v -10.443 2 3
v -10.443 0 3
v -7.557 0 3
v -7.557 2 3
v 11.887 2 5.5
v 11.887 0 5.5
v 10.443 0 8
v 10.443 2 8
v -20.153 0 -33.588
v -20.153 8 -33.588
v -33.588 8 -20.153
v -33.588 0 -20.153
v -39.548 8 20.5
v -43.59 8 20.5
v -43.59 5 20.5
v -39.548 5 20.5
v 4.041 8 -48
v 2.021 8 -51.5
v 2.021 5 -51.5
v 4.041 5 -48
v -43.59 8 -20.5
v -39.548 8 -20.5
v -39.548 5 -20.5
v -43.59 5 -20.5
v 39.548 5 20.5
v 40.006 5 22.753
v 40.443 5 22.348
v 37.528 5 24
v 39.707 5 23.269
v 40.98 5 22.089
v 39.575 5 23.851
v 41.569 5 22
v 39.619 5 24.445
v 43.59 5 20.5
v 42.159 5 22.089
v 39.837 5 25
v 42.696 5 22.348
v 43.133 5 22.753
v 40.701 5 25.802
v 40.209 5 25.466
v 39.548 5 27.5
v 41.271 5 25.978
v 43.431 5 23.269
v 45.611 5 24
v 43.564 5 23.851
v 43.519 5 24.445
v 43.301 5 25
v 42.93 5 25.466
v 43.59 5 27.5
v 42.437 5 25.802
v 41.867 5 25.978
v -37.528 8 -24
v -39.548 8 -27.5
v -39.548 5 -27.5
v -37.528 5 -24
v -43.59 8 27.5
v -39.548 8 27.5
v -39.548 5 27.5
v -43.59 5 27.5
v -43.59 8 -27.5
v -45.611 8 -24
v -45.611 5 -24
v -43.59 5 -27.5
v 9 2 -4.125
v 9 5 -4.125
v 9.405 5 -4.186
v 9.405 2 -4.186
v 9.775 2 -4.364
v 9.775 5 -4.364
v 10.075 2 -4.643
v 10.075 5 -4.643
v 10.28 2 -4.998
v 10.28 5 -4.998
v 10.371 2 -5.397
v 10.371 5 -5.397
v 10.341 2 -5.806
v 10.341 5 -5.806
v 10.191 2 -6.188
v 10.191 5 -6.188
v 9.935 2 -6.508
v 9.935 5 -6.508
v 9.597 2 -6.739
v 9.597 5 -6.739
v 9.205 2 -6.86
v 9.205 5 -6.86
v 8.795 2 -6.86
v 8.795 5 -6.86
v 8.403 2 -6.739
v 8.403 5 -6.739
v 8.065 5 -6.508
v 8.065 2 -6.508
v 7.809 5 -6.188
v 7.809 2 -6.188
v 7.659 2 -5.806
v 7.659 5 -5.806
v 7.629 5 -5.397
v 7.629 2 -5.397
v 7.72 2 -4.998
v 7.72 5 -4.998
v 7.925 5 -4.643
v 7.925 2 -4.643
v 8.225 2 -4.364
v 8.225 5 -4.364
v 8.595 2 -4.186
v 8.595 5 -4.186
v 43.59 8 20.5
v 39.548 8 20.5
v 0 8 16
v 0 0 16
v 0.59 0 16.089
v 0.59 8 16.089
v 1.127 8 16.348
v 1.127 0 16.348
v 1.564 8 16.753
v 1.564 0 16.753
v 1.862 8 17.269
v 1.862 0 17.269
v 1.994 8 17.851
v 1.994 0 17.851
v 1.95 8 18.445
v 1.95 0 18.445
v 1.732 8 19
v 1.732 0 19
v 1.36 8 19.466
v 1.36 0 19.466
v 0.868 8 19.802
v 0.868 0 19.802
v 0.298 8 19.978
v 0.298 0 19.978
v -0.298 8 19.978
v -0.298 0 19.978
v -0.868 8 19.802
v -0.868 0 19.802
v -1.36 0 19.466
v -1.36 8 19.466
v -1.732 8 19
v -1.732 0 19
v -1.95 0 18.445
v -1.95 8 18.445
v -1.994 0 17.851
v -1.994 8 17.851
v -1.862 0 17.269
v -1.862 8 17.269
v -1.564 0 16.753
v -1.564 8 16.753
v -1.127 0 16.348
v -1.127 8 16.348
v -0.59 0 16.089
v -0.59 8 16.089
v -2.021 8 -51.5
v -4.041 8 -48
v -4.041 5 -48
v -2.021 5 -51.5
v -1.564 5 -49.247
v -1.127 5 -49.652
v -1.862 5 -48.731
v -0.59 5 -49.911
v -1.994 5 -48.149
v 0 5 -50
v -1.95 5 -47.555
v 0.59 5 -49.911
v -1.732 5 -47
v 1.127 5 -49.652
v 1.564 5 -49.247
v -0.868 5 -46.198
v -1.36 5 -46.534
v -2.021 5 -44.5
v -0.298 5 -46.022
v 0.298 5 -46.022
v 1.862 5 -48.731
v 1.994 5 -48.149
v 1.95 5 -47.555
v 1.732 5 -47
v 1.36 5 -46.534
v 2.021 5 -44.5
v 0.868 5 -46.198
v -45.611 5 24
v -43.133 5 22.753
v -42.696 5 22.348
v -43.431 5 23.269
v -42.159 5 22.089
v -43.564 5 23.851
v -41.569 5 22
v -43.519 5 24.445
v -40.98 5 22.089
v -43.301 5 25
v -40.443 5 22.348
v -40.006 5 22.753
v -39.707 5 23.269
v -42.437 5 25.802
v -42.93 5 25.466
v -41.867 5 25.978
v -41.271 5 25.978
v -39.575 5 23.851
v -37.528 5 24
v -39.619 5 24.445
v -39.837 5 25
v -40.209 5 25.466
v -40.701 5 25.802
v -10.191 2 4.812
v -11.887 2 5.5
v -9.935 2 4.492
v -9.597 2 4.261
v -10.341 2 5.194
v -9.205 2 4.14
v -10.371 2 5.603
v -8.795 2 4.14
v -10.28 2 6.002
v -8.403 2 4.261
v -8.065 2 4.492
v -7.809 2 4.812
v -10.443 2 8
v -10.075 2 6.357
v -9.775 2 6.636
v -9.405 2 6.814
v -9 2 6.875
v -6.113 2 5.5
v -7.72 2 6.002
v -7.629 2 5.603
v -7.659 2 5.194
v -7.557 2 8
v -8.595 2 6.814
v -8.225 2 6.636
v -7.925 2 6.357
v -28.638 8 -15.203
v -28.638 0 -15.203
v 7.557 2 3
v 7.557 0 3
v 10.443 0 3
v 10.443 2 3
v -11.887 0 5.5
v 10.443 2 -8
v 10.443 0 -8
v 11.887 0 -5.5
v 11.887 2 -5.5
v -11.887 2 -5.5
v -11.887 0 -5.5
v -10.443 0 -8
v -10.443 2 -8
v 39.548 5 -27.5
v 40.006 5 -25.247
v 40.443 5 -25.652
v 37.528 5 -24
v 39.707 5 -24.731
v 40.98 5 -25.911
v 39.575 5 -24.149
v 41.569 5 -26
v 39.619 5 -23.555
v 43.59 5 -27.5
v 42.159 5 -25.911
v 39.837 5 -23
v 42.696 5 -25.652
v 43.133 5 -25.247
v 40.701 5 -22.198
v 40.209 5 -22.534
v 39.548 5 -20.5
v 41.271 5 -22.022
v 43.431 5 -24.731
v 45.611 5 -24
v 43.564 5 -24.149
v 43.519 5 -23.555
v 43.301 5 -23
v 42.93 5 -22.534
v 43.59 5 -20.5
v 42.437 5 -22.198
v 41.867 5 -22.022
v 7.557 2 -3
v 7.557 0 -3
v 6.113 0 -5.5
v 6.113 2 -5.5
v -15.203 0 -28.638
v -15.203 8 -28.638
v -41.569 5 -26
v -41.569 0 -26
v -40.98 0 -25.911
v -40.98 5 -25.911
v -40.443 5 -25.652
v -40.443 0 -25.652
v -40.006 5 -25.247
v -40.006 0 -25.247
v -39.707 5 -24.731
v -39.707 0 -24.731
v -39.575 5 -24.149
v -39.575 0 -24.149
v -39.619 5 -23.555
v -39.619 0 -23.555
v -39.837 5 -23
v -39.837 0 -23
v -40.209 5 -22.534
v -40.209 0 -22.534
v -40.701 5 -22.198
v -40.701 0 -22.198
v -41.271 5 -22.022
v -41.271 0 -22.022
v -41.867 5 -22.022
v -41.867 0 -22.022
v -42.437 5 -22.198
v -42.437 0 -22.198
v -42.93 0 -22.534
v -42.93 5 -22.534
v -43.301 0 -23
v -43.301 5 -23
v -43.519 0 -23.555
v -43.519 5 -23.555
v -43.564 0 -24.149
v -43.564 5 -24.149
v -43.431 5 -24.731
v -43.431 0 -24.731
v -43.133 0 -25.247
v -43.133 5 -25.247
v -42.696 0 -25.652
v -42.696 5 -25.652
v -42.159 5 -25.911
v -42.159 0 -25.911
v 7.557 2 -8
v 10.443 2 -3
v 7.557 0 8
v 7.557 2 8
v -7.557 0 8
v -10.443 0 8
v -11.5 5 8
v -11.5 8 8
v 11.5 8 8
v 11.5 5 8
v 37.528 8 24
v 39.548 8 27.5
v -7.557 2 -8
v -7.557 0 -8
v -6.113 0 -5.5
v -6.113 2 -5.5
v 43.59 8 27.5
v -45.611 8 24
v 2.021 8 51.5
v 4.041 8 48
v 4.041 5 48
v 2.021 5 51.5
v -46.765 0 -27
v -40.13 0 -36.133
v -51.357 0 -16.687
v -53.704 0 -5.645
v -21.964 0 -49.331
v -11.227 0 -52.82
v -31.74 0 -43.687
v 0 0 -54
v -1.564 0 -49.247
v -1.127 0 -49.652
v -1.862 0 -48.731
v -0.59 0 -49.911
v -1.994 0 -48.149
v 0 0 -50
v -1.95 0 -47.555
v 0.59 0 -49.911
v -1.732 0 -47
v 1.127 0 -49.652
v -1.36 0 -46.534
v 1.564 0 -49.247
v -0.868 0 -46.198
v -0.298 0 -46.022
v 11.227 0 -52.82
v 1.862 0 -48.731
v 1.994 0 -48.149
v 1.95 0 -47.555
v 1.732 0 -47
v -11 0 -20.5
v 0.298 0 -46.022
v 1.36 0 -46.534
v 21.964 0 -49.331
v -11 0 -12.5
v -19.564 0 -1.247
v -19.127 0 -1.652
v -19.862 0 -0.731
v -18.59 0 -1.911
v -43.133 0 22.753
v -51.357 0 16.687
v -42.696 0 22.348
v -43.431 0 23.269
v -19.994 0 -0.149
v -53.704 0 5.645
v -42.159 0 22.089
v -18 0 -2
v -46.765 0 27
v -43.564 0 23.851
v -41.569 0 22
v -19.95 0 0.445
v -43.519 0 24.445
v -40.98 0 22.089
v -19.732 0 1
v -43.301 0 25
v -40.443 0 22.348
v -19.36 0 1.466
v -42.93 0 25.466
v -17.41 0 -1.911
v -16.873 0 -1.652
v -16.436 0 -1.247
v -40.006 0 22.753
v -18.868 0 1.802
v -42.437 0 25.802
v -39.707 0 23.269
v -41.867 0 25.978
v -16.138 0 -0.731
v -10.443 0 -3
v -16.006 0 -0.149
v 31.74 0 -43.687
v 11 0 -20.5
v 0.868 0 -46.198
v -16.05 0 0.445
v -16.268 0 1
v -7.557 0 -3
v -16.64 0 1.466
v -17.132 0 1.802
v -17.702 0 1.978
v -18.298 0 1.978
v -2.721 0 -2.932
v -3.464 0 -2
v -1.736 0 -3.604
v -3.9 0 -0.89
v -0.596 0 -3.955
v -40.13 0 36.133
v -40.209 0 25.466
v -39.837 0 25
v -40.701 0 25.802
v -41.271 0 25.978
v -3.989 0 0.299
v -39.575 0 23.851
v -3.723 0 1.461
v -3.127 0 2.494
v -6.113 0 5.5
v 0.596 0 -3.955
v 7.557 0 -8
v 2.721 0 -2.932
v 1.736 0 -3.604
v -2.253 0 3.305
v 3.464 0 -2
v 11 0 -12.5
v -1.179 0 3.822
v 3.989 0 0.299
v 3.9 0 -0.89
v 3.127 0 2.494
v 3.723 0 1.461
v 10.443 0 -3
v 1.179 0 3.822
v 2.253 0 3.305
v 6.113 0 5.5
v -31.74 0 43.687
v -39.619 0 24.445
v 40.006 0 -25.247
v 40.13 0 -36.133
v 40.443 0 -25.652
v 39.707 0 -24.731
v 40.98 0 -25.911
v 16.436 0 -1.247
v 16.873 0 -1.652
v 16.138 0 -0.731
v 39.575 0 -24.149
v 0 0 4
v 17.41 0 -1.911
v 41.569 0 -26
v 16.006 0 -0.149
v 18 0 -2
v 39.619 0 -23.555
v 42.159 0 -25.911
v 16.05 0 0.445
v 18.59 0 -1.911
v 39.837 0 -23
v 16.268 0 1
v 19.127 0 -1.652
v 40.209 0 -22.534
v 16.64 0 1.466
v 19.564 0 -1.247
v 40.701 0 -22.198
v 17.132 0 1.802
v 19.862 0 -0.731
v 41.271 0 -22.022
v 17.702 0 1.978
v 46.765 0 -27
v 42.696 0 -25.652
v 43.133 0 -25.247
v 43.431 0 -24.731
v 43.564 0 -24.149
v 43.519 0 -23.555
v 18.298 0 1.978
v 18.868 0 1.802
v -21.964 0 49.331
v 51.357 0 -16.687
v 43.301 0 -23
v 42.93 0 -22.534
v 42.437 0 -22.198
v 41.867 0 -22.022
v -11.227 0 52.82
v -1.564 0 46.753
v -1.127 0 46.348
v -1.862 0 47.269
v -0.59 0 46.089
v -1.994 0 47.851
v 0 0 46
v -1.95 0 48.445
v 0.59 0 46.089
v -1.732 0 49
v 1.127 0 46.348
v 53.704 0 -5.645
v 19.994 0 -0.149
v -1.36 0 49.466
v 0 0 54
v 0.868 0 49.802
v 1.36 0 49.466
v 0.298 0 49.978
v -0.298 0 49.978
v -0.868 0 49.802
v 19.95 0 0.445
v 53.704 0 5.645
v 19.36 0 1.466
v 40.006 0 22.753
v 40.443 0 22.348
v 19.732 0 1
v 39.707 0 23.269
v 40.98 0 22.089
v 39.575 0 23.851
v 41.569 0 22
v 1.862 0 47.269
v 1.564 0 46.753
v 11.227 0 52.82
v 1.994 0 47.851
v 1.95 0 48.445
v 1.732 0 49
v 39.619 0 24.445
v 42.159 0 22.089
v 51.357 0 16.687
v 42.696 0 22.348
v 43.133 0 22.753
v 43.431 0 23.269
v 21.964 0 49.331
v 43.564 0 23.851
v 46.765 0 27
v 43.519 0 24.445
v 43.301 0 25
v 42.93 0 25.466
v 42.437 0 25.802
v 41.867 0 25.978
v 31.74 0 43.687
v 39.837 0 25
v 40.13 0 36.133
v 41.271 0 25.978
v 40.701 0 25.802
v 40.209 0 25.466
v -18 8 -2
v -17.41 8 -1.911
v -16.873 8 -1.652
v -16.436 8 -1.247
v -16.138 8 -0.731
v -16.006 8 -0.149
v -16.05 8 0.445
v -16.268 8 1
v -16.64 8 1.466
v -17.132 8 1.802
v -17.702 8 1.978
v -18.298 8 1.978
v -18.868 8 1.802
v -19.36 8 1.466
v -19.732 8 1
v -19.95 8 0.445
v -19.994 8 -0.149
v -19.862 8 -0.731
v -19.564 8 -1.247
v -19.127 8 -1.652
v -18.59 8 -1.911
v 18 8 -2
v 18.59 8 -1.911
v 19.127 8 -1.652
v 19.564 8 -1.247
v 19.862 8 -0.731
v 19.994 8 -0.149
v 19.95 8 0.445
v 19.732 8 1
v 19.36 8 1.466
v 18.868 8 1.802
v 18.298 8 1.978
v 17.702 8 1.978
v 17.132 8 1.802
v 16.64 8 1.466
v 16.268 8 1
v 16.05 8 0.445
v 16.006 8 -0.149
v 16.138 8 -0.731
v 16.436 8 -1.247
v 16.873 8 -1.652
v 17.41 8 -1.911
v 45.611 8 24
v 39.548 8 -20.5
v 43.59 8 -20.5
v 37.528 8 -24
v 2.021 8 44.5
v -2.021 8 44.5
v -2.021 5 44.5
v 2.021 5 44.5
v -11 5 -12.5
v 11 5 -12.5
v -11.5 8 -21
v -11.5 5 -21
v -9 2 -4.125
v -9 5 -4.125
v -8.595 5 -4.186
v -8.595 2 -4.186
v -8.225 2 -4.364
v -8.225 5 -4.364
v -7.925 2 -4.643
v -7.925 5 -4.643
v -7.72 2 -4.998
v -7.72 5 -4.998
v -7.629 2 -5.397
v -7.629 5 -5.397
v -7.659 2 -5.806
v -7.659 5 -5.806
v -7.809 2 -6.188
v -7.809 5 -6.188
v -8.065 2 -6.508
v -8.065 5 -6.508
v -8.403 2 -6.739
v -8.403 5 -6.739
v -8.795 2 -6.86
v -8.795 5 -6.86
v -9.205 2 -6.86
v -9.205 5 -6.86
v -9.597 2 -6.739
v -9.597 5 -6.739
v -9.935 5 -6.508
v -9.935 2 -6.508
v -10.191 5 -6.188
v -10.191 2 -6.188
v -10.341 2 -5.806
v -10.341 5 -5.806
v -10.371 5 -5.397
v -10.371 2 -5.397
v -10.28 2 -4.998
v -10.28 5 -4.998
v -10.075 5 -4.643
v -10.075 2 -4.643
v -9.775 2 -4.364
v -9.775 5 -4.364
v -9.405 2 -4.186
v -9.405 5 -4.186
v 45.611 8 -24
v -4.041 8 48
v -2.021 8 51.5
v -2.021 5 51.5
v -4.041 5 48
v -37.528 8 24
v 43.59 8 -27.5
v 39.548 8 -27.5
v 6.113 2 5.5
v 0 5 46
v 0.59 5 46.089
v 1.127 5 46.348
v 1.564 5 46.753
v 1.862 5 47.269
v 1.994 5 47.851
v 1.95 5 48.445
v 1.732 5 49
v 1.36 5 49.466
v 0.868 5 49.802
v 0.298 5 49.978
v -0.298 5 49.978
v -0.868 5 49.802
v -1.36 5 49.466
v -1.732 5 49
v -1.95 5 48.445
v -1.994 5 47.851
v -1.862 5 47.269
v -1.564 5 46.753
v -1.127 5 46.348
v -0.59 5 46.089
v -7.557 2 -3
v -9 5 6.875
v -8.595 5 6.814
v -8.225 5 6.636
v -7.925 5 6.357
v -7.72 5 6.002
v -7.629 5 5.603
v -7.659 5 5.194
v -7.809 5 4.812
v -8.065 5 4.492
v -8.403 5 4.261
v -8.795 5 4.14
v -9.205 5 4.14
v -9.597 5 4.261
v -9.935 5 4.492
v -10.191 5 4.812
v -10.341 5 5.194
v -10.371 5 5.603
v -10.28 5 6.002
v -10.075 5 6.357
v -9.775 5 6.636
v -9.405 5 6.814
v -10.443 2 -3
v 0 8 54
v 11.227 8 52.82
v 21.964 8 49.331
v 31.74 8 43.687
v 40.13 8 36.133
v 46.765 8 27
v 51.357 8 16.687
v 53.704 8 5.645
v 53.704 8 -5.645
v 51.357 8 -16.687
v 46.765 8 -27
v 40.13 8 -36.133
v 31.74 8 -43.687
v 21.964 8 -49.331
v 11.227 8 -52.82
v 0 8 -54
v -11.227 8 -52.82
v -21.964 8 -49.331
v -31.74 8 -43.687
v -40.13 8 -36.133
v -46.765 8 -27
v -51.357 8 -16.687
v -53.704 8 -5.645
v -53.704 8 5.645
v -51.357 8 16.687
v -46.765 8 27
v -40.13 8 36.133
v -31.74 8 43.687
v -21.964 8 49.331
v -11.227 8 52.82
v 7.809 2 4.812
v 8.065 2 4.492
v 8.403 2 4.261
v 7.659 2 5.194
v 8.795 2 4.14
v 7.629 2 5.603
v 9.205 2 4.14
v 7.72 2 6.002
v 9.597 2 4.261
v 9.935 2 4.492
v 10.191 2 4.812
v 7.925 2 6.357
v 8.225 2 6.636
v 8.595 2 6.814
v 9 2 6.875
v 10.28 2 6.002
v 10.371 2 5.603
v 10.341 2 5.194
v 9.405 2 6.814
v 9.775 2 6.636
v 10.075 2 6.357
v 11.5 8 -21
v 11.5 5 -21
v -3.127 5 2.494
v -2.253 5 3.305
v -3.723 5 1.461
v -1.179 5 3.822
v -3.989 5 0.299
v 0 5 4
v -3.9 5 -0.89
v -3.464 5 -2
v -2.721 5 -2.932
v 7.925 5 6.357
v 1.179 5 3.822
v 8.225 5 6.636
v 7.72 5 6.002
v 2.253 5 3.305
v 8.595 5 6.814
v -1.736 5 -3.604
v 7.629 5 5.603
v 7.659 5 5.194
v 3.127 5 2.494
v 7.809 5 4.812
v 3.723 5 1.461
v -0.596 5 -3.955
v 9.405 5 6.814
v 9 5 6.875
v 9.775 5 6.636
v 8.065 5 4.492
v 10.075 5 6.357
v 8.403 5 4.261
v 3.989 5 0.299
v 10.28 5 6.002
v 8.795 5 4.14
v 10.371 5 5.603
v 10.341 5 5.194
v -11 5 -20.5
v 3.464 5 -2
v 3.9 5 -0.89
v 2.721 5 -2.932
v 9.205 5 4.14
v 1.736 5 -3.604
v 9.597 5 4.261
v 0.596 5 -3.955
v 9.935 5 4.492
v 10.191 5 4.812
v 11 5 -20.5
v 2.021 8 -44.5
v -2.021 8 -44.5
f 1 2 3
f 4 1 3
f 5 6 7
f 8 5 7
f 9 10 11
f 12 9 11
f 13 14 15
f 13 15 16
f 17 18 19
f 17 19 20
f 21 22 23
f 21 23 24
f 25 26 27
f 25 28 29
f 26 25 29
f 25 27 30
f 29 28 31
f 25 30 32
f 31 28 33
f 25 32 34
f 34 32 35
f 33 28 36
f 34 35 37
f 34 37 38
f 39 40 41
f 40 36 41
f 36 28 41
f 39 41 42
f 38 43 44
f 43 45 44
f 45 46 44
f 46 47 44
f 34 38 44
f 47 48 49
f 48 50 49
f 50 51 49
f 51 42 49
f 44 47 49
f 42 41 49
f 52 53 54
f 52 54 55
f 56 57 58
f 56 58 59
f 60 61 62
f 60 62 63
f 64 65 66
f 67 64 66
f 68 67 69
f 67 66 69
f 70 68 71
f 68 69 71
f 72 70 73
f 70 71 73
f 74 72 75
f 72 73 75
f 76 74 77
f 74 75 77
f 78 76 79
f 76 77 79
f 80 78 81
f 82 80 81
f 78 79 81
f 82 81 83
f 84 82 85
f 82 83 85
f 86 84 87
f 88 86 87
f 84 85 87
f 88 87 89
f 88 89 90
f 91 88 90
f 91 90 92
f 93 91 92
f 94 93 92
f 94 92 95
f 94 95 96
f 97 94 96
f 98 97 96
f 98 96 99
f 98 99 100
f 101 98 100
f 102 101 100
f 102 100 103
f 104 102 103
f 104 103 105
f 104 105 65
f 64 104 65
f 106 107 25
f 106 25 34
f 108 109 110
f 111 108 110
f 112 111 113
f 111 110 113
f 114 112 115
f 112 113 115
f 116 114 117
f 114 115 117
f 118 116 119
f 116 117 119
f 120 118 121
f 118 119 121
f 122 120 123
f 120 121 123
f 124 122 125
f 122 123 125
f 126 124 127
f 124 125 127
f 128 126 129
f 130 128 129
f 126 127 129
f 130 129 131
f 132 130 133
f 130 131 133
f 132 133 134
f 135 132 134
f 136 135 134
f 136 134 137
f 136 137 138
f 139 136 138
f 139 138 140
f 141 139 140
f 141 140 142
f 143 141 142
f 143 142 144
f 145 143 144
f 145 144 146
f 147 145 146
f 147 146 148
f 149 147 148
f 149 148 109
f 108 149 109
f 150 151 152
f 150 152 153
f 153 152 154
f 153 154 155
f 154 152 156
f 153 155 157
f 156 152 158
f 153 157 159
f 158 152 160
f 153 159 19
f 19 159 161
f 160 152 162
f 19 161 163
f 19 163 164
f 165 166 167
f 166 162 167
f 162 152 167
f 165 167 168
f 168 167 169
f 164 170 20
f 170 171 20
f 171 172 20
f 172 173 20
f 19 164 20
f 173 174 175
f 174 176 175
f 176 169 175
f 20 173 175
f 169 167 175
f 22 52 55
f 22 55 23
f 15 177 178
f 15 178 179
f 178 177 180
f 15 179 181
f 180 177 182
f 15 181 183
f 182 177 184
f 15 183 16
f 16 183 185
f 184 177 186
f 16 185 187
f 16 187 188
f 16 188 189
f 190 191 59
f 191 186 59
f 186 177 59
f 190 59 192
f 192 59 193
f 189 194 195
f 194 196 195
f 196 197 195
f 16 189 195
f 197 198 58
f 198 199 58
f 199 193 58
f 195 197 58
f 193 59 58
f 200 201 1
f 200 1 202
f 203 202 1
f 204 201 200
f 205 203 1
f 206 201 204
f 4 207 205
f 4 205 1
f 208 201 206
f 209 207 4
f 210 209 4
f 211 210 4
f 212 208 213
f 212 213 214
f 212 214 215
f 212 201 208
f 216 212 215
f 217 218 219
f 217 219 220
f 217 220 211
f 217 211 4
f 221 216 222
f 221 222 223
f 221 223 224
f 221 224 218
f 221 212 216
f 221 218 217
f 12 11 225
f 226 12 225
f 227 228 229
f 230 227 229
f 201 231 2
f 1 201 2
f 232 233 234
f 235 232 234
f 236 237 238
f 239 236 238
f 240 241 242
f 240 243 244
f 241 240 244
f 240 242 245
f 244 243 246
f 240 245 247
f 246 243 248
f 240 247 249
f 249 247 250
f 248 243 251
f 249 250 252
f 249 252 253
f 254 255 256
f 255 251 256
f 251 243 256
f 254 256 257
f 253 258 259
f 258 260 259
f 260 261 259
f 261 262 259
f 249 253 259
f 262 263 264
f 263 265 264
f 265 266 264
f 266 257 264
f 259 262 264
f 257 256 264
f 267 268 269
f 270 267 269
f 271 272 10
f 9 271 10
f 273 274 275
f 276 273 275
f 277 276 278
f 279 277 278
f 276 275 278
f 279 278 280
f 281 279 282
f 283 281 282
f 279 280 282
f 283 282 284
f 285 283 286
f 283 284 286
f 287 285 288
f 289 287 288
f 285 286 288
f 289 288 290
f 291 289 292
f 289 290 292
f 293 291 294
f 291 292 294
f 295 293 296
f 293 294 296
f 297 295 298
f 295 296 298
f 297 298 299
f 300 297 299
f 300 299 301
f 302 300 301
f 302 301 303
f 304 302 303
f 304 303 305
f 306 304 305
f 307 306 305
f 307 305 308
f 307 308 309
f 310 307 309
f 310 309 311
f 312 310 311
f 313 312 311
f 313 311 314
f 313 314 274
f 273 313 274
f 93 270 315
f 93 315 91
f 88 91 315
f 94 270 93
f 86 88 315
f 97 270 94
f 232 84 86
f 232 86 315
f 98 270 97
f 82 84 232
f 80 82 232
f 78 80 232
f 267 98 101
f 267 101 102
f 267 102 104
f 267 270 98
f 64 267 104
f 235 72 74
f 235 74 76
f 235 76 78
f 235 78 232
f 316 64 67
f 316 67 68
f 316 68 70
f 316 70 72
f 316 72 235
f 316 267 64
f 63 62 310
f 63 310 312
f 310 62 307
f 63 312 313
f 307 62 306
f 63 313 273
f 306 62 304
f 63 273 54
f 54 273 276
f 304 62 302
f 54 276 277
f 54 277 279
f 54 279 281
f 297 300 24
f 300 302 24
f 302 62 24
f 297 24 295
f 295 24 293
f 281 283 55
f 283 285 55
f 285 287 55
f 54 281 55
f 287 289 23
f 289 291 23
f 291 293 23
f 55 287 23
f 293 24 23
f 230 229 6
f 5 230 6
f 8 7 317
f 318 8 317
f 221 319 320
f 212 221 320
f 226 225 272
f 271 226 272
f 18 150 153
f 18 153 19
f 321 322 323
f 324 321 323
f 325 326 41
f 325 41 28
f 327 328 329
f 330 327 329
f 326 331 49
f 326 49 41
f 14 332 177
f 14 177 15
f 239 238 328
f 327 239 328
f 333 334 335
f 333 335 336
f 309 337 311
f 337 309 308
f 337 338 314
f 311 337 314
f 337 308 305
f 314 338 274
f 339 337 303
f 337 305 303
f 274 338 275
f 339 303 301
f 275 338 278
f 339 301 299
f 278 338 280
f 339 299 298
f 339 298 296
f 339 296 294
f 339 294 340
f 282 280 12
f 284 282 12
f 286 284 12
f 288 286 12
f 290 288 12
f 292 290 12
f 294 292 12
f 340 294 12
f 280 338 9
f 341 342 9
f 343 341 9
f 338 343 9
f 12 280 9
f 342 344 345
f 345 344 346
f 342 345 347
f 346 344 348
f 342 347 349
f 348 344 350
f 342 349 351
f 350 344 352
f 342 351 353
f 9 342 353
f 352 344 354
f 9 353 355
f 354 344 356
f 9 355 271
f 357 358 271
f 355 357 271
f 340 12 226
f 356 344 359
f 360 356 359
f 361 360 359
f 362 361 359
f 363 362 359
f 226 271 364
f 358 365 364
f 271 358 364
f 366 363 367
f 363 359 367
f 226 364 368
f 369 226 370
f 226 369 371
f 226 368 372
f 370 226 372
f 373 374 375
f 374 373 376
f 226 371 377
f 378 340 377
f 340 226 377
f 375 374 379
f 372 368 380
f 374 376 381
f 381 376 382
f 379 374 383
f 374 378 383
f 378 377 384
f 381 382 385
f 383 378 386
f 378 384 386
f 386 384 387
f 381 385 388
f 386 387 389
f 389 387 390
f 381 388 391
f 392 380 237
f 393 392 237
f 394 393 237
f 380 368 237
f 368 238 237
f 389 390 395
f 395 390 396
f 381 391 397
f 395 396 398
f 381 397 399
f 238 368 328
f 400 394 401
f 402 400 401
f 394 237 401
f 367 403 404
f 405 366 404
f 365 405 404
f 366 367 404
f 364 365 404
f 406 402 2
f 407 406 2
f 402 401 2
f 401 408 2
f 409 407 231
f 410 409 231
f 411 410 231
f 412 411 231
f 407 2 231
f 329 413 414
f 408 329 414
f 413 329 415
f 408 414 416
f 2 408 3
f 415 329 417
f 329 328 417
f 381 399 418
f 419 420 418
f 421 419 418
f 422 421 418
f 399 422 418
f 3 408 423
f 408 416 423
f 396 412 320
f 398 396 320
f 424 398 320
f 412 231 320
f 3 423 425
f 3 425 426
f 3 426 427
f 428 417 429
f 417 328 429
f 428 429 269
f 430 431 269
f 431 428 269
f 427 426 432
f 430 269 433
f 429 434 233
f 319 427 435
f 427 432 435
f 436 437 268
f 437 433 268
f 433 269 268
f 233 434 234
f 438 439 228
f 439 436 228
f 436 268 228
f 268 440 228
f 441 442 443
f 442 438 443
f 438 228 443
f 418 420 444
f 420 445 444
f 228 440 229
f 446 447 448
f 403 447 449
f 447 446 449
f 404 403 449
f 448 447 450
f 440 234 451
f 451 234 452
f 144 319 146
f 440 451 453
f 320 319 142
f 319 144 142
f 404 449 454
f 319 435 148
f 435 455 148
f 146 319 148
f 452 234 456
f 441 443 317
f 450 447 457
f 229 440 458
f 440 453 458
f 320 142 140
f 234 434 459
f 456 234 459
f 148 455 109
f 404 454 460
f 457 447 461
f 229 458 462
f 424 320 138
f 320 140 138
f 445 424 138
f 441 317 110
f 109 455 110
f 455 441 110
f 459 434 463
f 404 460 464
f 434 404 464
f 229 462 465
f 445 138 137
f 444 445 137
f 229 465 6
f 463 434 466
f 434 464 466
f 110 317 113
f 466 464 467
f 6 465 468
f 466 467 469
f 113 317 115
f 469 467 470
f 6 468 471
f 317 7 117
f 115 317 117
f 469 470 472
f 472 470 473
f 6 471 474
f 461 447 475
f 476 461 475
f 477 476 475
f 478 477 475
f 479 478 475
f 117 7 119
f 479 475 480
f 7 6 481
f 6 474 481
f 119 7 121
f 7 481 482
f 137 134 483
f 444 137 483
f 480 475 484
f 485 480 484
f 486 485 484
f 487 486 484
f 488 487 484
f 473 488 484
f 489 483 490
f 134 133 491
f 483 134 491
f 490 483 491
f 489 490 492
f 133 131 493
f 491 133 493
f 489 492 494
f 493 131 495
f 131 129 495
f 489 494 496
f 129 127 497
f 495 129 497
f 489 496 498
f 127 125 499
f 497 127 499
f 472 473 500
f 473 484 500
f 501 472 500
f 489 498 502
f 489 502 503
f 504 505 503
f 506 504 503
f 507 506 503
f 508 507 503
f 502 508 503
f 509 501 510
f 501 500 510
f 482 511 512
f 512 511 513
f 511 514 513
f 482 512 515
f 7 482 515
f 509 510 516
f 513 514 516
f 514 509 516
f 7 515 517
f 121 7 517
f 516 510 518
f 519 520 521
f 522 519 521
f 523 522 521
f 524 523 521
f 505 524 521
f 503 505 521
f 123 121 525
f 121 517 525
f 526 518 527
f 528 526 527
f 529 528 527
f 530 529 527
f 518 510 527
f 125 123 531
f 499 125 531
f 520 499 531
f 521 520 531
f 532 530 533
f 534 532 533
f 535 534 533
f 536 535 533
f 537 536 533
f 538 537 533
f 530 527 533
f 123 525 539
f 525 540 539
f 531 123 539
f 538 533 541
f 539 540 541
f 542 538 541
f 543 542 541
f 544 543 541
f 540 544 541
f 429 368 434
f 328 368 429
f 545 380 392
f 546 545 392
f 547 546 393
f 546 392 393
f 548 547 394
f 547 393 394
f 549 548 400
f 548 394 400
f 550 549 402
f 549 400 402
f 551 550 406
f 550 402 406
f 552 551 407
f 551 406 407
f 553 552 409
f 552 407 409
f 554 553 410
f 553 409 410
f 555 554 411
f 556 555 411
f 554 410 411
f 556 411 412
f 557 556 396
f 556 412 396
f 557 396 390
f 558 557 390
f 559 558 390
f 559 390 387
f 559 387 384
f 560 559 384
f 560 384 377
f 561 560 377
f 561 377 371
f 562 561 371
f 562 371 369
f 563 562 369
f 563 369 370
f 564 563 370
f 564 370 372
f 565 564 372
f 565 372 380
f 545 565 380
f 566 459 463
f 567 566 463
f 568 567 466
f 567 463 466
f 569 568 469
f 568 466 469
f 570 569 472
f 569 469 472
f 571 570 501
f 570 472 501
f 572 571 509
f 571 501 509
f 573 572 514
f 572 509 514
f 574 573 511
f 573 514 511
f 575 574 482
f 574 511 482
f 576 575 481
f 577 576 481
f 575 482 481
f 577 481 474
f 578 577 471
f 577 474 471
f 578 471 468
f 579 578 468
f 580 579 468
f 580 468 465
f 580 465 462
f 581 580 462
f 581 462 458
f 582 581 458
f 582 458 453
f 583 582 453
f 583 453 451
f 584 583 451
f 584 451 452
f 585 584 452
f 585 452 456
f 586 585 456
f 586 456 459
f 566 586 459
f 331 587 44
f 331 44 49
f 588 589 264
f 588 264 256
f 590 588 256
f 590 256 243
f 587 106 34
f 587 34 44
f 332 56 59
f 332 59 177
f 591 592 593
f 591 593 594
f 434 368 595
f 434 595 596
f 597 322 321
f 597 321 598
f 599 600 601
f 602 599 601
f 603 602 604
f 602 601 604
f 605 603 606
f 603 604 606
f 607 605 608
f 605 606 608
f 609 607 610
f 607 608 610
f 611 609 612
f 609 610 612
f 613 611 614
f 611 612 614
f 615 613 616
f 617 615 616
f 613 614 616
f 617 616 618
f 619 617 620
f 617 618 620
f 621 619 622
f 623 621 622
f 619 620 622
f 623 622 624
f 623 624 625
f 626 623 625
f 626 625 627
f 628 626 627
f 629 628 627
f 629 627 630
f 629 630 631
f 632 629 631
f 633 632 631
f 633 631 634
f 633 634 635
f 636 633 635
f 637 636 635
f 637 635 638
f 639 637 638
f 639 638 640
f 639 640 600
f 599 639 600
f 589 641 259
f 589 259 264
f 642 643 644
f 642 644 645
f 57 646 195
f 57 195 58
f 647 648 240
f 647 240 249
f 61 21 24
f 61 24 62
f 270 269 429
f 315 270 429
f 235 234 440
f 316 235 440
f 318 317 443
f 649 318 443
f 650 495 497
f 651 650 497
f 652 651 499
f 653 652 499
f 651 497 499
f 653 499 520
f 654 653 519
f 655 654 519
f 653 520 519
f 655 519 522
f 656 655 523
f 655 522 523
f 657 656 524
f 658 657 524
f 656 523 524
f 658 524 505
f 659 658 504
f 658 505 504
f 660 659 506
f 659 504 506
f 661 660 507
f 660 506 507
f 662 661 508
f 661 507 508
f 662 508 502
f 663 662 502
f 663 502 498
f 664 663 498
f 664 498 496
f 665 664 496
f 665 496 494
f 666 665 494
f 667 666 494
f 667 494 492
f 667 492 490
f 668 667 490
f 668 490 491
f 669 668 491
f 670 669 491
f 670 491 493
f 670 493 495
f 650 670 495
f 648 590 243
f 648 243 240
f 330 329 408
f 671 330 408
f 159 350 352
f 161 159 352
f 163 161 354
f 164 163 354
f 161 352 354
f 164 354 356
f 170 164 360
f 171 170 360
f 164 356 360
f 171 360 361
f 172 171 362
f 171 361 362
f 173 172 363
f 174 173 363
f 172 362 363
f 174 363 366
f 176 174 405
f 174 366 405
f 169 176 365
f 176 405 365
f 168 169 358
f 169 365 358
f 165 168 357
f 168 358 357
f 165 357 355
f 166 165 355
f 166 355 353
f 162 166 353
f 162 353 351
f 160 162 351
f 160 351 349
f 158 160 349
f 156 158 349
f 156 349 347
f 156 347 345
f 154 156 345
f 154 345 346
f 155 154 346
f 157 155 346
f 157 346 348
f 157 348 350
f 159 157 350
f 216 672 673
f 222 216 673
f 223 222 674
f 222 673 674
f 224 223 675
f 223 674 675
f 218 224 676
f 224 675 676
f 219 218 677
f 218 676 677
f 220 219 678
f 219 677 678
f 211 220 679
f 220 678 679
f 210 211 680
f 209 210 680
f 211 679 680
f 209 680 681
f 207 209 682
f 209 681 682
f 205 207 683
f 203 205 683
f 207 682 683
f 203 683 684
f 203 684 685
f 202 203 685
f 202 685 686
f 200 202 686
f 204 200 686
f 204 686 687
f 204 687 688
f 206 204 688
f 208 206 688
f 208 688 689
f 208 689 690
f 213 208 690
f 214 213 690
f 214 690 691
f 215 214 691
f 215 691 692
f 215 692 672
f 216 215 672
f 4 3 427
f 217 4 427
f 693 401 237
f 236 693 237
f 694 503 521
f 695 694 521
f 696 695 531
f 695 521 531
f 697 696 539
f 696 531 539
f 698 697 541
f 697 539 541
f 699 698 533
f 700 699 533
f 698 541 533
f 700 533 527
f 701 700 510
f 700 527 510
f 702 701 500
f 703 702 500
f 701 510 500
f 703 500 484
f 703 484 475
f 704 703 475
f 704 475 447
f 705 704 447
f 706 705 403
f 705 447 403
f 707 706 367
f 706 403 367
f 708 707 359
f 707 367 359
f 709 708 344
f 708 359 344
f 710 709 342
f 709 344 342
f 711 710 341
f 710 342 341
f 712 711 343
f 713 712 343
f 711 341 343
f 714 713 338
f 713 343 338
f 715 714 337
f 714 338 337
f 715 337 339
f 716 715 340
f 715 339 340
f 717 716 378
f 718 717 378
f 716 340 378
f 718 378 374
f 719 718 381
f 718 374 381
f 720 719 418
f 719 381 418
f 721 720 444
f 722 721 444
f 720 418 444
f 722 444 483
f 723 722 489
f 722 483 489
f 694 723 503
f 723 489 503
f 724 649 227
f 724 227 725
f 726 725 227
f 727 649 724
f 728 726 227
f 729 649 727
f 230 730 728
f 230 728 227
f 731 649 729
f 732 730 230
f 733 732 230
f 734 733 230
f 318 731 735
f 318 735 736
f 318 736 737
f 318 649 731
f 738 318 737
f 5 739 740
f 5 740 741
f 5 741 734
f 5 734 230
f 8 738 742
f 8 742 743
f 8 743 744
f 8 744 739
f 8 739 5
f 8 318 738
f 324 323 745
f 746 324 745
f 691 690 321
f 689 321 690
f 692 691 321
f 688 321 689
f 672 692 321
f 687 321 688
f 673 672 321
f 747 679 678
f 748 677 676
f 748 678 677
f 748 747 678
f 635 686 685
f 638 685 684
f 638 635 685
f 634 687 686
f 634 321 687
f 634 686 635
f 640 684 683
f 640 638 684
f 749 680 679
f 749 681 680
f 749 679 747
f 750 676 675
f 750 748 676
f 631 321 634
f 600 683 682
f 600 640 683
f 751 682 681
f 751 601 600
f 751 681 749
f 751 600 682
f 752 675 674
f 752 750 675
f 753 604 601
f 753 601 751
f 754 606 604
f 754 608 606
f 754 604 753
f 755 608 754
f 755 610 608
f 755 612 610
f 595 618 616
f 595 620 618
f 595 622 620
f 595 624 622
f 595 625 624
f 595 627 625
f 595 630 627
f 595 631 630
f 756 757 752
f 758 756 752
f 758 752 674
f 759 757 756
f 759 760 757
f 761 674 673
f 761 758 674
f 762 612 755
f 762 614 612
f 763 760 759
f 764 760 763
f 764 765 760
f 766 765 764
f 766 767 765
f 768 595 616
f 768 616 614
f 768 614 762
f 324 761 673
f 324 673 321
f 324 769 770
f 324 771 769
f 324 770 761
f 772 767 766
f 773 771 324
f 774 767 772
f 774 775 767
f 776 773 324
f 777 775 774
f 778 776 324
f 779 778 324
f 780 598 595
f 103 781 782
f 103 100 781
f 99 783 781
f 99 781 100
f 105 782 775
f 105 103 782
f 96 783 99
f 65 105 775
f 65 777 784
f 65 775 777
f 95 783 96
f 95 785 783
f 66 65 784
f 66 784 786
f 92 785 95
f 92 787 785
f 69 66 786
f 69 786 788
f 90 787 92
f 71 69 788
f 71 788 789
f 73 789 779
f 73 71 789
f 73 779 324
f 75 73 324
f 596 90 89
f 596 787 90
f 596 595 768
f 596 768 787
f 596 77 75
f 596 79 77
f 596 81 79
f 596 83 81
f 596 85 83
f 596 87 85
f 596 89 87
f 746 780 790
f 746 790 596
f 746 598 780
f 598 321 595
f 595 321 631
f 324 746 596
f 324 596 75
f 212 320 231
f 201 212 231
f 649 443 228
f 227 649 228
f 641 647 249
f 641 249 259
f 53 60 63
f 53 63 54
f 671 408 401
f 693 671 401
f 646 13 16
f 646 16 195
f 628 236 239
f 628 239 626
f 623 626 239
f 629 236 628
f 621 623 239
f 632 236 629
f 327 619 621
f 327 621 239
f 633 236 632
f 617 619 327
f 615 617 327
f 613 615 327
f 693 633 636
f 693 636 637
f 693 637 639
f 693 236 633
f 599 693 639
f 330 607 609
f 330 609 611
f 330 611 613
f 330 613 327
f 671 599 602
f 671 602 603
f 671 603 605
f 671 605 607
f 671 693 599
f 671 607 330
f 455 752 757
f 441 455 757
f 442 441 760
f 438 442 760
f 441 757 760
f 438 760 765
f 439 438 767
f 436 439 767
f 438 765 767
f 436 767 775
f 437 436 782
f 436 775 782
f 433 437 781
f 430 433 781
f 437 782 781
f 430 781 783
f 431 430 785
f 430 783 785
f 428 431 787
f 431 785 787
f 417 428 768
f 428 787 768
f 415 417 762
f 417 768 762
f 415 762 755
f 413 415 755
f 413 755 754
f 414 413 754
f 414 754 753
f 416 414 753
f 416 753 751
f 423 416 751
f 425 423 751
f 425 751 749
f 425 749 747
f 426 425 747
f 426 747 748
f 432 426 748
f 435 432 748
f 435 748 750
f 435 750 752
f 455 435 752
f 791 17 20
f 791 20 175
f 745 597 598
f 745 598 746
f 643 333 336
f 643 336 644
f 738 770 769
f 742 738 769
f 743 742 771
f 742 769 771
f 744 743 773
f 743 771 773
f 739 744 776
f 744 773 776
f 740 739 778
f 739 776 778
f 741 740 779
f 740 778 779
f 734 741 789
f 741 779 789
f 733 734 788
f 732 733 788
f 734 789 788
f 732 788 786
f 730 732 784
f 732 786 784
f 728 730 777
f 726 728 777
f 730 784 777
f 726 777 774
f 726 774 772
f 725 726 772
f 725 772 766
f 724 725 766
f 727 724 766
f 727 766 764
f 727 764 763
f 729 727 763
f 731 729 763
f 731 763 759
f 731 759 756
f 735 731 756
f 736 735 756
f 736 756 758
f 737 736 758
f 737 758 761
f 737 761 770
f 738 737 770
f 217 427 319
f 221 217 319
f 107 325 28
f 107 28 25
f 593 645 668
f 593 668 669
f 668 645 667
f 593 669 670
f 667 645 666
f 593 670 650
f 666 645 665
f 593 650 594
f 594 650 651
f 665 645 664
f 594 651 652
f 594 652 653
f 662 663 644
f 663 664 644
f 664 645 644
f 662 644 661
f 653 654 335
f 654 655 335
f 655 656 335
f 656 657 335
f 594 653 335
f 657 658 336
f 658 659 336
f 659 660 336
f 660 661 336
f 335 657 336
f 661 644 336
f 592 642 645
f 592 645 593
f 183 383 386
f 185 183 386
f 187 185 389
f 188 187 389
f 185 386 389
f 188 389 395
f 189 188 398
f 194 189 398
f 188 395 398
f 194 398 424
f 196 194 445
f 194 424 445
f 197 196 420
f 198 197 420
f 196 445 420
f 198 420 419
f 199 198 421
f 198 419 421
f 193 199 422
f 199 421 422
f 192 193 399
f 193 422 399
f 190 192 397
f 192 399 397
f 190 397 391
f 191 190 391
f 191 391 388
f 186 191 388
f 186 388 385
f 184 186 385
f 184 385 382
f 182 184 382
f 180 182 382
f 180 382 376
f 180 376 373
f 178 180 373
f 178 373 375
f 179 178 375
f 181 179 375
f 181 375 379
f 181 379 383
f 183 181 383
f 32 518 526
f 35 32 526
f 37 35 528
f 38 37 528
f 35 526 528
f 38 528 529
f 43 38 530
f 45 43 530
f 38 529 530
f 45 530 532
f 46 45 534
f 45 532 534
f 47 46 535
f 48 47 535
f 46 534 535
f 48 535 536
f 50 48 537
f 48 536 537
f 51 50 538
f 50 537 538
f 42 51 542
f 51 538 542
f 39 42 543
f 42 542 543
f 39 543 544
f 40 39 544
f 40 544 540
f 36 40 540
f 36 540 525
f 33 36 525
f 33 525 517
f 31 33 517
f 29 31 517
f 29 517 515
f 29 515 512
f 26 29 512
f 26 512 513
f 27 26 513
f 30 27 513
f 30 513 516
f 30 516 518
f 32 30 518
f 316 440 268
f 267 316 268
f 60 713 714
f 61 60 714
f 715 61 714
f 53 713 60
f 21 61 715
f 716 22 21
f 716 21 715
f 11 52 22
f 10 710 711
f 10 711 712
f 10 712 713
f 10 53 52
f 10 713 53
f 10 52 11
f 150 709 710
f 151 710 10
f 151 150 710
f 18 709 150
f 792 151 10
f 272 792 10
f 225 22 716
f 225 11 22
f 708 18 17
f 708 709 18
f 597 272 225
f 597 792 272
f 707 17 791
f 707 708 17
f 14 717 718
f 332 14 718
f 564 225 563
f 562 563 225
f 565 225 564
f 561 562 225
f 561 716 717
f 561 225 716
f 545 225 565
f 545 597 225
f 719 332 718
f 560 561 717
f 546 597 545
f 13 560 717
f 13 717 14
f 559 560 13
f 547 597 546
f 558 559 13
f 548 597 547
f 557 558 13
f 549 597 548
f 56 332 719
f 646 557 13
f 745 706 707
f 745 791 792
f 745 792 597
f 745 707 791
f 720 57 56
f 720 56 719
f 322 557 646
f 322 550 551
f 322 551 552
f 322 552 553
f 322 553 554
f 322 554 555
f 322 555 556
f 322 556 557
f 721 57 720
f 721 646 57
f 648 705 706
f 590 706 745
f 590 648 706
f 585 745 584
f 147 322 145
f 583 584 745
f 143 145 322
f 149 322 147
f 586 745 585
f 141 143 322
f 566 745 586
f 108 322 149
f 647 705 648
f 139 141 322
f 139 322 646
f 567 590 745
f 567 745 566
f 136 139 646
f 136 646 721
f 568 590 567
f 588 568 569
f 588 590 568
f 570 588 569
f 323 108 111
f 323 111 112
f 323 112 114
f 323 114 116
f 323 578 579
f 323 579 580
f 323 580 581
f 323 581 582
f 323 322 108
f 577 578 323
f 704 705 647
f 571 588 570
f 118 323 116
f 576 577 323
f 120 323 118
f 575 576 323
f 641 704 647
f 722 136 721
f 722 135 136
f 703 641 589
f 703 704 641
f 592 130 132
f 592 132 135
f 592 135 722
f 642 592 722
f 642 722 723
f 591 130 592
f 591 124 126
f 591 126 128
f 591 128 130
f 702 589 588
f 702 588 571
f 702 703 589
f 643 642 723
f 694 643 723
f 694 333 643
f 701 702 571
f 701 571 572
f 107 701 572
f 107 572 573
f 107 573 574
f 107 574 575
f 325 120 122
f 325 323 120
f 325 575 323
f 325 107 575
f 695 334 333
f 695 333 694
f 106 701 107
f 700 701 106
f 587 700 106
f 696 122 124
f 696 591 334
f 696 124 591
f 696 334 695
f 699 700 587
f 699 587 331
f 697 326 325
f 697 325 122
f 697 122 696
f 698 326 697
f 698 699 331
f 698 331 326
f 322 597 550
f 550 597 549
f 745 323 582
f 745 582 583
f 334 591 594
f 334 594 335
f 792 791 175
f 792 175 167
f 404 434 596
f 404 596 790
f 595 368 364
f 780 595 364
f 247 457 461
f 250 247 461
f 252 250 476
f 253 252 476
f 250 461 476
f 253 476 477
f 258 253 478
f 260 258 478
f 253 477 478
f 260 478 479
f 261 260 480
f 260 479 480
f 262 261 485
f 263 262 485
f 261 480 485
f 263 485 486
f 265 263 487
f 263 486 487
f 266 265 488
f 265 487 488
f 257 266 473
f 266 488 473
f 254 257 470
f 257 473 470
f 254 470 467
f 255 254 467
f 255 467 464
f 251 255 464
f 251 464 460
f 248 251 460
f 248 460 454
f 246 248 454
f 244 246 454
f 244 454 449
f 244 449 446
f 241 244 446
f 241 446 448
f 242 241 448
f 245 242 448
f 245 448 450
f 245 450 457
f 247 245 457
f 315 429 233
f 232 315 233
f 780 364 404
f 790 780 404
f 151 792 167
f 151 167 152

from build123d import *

# Parameters (mm, degrees)
SKETCH1_R                       = 54
BASE_PLATE_DEPTH                = 8
HOLE_PATTERN_R                  = 2
MOTOR_MOUNT_HOLES_DEPTH         = 77.785415282
SKETCH3_R                       = 1.375
SKETCH3_R_2                     = 4
ENCODER_MOUNTING_HOLES_DEPTH    = 77.785415282
SKETCH4_W                       = 22
SKETCH4_H                       = 8
ENCODER_WIRE_PASS_THROUGH_DEPTH = 5
MOTOR_WIRE_PASS_THROUGH_DEPTH   = 77.785415282
SKETCH6_W                       = 11.998985868
SKETCH6_H                       = 14
CUT_EXTRUDE6_DEPTH              = 2
CUT_EXTRUDE7_DEPTH              = 2
CUT_EXTRUDE8_DEPTH              = 3
SKETCH10_W                      = 23
SKETCH10_H                      = 29
CUT_EXTRUDE9_DEPTH              = 3


with BuildPart() as part:
    # Sketch1 → Base Plate (new body)
    with BuildSketch(Plane(origin=(0, 0, 0), x_dir=(1, 0, 0), z_dir=(0, 1, 0))):
        with Locations(Location((0, 0, 0), (0, 0, 270))):
            Circle(SKETCH1_R)
    extrude(amount=BASE_PLATE_DEPTH)

    # Hole Pattern → Motor Mount Holes (cut, through all)
    with BuildSketch(Plane.XZ):
        with Locations(Location((0, 48, 0), (0, 0, 270))):
            Circle(HOLE_PATTERN_R)
        with Locations(Location((41.569219382, 24, 0), (0, 0, 270))):
            Circle(HOLE_PATTERN_R)
        with Locations(Location((41.569219382, -24, 0), (0, 0, 270))):
            Circle(HOLE_PATTERN_R)
        with Locations(Location((0, -48, 0), (0, 0, 270))):
            Circle(HOLE_PATTERN_R)
        with Locations(Location((-41.569219382, -24, 0), (0, 0, 270))):
            Circle(HOLE_PATTERN_R)
        with Locations(Location((-41.569219382, 24, 0), (0, 0, 270))):
            Circle(HOLE_PATTERN_R)
        with Locations(Location((0, 18, 0), (0, 0, 270))):
            Circle(HOLE_PATTERN_R)
        with Locations(Location((18, 0, 0), (0, 0, 270))):
            Circle(HOLE_PATTERN_R)
        with Locations(Location((-18, 0, 0), (0, 0, 270))):
            Circle(HOLE_PATTERN_R)
    extrude(amount=-MOTOR_MOUNT_HOLES_DEPTH, mode=Mode.SUBTRACT)

    # Sketch3 → Encoder mounting holes (cut, through all)
    with BuildSketch(Plane(origin=(0, 8, 0), x_dir=(1, 0, 0), z_dir=(0, 1, 0))):
        with Locations(Location((-9, 5.5, 0), (0, 0, 270))):
            Circle(SKETCH3_R)
        with Locations(Location((9, 5.5, 0), (0, 0, 270))):
            Circle(SKETCH3_R)
        with Locations(Location((9, -5.5, 0), (0, 0, 270))):
            Circle(SKETCH3_R)
        with Locations(Location((-9, -5.5, 0), (0, 0, 270))):
            Circle(SKETCH3_R)
        with Locations(Location((0, 0, 0), (0, 0, 270))):
            Circle(SKETCH3_R_2)
    extrude(amount=-ENCODER_MOUNTING_HOLES_DEPTH, mode=Mode.SUBTRACT)

    # Sketch4 → Encoder Wire Pass through (cut)
    with BuildSketch(Plane(origin=(0, 0, 0), x_dir=(1, 0, 0), z_dir=(0, 1, 0))):
        with Locations((0, 16.5)):
            Rectangle(SKETCH4_W, SKETCH4_H)
    extrude(amount=ENCODER_WIRE_PASS_THROUGH_DEPTH, mode=Mode.SUBTRACT)

    # Sketch5 → Motor Wire pass through (cut, through all)
    with BuildSketch(Plane(origin=(0, 8, 0), x_dir=(1, 0, 0), z_dir=(0, 1, 0))):
        Polygon((-33.587572106, 20.152543264), (-28.637824638, 15.202795796), (-15.202795796, 28.637824638), (-20.152543264, 33.587572106), align=None)
    extrude(amount=-MOTOR_WIRE_PASS_THROUGH_DEPTH, mode=Mode.SUBTRACT)

    # Sketch6 → Cut-Extrude6 (cut)
    with BuildSketch(Plane(origin=(0, 8, 0), x_dir=(1, 0, 0), z_dir=(0, 1, 0))):
        with Locations((0, 12.5)):
            Rectangle(SKETCH6_W, SKETCH6_H)
    extrude(amount=-CUT_EXTRUDE6_DEPTH, mode=Mode.SUBTRACT)

    # Sketch7 → Cut-Extrude7 (cut)
    with BuildSketch(Plane.XZ):
        Polygon((7.556624327, 3), (10.443375673, 3), (11.886751346, 5.5), (10.443375673, 8), (7.556624327, 8), (6.113248654, 5.5), align=None)
        Polygon((10.443375673, -8), (11.886751346, -5.5), (10.443375673, -3), (7.556624327, -3), (6.113248654, -5.5), (7.556624327, -8), align=None)
        Polygon((-7.556624327, -8), (-6.113248654, -5.5), (-7.556624327, -3), (-10.443375673, -3), (-11.886751346, -5.5), (-10.443375673, -8), align=None)
        Polygon((-7.556624327, 3), (-6.113248654, 5.5), (-7.556624327, 8), (-10.443375673, 8), (-11.886751346, 5.5), (-10.443375673, 3), align=None)
    extrude(amount=-CUT_EXTRUDE7_DEPTH, mode=Mode.SUBTRACT)

    # Sketch9 → Cut-Extrude8 (cut)
    with BuildSketch(Plane.XZ.offset(-8)):
        Polygon((39.548493439, -27.5), (43.589945324, -27.5), (45.610671266, -24), (43.589945324, -20.5), (39.548493439, -20.5), (37.527767497, -24), align=None)
        Polygon((-4.041451884, -48), (-2.020725942, -51.5), (2.020725942, -51.5), (4.041451884, -48), (2.020725942, -44.5), (-2.020725942, -44.5), align=None)
        Polygon((43.589945324, 20.5), (45.610671266, 24), (43.589945324, 27.5), (39.548493439, 27.5), (37.527767497, 24), (39.548493439, 20.5), align=None)
        Polygon((4.041451884, 48), (2.020725942, 51.5), (-2.020725942, 51.5), (-4.041451884, 48), (-2.020725942, 44.5), (2.020725942, 44.5), align=None)
        Polygon((-39.548493439, 27.5), (-43.589945324, 27.5), (-45.610671266, 24), (-43.589945324, 20.5), (-39.548493439, 20.5), (-37.527767497, 24), align=None)
        Polygon((-43.589945324, -20.5), (-45.610671266, -24), (-43.589945324, -27.5), (-39.548493439, -27.5), (-37.527767497, -24), (-39.548493439, -20.5), align=None)
    extrude(amount=CUT_EXTRUDE8_DEPTH, mode=Mode.SUBTRACT)

    # Sketch10 → Cut-Extrude9 (cut)
    with BuildSketch(Plane(origin=(0, 8, 0), x_dir=(1, 0, 0), z_dir=(0, 1, 0))):
        with Locations((0, 6.5)):
            Rectangle(SKETCH10_W, SKETCH10_H)
    extrude(amount=-CUT_EXTRUDE9_DEPTH, mode=Mode.SUBTRACT)


solid = part.part
